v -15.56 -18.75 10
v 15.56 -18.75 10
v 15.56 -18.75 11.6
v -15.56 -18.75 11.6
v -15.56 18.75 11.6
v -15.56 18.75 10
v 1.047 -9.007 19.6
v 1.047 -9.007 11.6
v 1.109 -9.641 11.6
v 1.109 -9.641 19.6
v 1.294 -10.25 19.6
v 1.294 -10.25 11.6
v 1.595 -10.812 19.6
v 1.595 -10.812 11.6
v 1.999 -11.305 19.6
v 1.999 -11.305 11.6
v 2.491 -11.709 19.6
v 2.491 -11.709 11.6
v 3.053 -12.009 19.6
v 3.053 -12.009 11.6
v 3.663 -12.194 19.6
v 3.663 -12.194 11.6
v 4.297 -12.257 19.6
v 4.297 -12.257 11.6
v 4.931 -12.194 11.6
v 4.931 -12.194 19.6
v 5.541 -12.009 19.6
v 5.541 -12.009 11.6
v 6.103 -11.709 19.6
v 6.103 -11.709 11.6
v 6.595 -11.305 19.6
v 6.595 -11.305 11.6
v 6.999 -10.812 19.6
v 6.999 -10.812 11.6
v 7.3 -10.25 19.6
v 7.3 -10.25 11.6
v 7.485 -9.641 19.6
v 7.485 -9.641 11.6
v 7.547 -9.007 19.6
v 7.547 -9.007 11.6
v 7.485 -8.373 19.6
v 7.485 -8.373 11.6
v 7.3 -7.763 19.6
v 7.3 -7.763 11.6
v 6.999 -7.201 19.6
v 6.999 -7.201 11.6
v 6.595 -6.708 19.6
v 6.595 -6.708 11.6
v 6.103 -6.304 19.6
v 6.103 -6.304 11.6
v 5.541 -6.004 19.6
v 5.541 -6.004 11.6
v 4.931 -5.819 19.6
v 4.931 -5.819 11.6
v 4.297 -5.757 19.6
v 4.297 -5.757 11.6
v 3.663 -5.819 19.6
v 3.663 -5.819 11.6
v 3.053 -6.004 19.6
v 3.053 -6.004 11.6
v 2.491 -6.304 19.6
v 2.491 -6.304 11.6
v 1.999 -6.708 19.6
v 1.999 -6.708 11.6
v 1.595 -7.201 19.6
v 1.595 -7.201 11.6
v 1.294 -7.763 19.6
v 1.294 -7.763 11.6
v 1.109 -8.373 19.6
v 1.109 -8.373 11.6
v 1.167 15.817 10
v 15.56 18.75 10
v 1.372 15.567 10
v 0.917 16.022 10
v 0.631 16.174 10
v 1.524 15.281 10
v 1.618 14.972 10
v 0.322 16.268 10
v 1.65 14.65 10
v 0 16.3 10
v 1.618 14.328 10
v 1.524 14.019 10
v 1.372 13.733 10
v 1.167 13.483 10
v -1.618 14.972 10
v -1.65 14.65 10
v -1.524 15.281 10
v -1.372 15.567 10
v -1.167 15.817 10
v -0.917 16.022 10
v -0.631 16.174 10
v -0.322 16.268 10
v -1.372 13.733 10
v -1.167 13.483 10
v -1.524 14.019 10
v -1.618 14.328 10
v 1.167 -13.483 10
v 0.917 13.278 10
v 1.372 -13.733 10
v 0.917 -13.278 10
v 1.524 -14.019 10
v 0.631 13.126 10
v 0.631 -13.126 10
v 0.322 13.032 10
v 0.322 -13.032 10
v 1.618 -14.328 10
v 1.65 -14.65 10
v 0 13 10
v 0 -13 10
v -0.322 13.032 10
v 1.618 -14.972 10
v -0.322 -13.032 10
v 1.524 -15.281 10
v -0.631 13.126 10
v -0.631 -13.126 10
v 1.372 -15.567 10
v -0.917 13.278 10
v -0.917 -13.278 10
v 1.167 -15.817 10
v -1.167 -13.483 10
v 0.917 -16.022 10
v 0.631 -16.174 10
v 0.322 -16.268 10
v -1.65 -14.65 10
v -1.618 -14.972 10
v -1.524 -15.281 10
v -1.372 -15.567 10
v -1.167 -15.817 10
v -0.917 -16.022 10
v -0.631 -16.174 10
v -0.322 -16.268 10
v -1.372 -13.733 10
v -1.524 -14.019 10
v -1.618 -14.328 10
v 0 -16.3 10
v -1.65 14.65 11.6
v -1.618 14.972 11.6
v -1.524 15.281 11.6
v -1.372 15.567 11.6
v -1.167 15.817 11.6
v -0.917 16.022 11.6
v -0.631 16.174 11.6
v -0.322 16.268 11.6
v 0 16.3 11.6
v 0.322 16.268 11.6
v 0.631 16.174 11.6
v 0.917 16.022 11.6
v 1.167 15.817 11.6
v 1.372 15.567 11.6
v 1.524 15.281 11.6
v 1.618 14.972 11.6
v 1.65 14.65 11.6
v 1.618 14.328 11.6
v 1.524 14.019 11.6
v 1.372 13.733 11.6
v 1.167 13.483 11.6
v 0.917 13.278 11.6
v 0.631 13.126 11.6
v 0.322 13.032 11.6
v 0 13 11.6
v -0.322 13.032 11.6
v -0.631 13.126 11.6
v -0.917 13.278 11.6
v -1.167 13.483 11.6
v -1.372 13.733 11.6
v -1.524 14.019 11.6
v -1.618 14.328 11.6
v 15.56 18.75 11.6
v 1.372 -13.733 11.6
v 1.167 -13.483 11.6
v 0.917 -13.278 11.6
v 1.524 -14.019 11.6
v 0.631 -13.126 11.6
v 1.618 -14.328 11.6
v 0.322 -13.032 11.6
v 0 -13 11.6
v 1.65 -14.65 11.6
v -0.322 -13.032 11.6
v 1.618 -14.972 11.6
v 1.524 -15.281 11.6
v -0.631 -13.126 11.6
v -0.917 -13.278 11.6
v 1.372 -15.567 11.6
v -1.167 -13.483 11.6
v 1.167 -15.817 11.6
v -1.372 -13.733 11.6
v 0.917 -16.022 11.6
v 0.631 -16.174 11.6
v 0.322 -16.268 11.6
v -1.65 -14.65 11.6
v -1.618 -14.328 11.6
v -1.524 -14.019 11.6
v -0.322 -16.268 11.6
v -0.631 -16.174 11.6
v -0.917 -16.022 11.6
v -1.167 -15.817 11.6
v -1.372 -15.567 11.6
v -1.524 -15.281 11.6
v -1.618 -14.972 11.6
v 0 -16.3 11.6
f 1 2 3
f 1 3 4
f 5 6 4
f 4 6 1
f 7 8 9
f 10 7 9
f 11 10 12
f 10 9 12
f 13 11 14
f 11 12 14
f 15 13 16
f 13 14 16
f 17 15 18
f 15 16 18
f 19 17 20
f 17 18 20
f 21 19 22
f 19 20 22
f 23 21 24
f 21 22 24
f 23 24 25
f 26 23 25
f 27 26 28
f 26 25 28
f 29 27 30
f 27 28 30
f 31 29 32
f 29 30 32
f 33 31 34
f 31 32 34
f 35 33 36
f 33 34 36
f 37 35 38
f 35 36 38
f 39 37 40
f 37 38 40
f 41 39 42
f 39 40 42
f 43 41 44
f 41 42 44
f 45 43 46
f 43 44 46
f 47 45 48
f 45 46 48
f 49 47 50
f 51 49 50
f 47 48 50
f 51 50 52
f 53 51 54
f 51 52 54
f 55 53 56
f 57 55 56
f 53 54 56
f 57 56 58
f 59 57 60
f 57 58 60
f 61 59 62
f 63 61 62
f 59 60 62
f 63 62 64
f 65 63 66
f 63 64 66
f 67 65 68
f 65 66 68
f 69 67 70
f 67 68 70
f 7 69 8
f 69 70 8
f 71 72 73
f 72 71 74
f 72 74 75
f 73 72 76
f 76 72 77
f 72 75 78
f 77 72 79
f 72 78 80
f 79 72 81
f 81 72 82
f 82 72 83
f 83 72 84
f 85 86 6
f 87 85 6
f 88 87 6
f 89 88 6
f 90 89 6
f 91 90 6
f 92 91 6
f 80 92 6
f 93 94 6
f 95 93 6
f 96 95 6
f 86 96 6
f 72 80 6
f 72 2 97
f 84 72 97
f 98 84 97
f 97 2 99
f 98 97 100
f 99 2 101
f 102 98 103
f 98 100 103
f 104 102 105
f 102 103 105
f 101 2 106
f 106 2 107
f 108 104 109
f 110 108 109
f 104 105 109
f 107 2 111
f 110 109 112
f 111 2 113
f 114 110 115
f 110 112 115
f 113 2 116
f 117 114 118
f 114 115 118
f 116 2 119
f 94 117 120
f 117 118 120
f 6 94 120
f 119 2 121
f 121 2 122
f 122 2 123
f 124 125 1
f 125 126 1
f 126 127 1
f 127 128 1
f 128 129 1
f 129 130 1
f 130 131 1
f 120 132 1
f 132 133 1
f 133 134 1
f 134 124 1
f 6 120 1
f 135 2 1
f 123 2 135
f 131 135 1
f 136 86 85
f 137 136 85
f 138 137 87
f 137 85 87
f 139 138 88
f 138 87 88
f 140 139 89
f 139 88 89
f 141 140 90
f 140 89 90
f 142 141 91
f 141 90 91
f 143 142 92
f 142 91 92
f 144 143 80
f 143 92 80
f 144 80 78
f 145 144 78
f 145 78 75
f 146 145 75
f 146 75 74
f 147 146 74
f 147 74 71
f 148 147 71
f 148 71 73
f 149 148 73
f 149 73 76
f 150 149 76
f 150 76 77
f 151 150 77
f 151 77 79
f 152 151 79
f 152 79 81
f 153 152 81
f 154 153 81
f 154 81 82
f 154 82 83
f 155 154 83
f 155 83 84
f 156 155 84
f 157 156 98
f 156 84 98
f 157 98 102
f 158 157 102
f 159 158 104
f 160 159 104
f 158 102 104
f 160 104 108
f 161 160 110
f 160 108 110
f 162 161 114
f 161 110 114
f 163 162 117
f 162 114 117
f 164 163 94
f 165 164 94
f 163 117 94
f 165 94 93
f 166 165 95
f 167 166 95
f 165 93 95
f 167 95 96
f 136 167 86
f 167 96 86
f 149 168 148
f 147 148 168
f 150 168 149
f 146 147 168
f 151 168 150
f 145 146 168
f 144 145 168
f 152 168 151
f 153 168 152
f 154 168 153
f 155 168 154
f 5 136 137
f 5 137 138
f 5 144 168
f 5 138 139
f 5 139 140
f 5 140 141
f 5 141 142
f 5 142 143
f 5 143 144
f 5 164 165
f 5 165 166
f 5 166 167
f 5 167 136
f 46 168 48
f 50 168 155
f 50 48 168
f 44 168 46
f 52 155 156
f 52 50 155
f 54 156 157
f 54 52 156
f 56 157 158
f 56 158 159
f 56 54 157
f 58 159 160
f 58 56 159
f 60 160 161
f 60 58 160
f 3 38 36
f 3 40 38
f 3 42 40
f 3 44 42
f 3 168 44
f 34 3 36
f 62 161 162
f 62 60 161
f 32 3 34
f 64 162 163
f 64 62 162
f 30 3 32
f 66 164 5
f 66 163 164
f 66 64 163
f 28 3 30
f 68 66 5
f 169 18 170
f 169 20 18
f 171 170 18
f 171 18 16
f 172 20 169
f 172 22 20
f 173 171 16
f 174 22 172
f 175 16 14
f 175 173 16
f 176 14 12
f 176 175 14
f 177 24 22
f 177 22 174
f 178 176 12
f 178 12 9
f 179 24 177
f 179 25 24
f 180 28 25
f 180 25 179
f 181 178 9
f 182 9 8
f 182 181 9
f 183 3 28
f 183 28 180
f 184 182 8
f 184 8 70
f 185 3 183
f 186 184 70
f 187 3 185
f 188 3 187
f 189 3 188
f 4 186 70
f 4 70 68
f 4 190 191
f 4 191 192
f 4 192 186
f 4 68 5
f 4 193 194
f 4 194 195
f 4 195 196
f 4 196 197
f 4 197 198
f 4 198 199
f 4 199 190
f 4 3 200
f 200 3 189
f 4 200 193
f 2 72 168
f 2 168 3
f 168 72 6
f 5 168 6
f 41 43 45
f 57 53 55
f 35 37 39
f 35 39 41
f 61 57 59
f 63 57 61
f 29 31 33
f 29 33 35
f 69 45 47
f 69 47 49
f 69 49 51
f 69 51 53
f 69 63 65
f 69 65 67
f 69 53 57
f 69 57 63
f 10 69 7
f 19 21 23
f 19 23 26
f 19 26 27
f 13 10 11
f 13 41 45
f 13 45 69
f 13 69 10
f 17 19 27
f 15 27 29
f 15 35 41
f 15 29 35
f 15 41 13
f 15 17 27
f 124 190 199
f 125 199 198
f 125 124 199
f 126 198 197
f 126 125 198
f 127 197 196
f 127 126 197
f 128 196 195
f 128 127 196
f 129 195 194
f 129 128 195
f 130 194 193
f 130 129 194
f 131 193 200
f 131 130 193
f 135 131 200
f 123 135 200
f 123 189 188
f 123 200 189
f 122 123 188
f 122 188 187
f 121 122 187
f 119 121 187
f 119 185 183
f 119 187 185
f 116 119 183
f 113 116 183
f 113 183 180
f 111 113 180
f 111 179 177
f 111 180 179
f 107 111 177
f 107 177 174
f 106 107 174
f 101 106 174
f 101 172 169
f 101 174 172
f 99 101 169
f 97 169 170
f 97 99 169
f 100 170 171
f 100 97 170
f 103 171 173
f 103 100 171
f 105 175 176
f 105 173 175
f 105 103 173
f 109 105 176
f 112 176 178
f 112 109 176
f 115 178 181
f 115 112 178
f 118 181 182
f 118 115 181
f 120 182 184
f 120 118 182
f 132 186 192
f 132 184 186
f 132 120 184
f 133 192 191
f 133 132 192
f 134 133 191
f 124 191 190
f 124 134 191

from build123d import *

# Parameters (mm, degrees)
SKETCH018_W             = 31.12
SKETCH018_H             = 37.5
PAD010_DEPTH            = 1.6
SKETCH019_R             = 1.65
POCKET006_DEPTH         = 99.115397
SKETCH032_R             = 3.25
PAD018_DEPTH            = 8
BODY003_PLACEMENT_ANGLE = 180


with BuildPart() as part:
    # Sketch018 → Pad010 (new body)
    with BuildSketch(Plane.XY):
        Rectangle(SKETCH018_W, SKETCH018_H)
    extrude(amount=PAD010_DEPTH)

    # Sketch019 (on Face5 of Pad010) → Pocket006 (cut, through all)
    with BuildSketch(Plane(origin=(0, 0, 0), x_dir=(1, 0, 0), z_dir=(0, 0, -1))):
        with Locations((0, 14.65)):
            Circle(SKETCH019_R)
    pocket006 = extrude(amount=-POCKET006_DEPTH, mode=Mode.SUBTRACT)

    # Mirrored008: Pocket006 across Sketch019 H_Axis
    add(pocket006.mirror(Plane(origin=(0, 0, 0), x_dir=(0, 0, -1), z_dir=(0, -1, 0))), mode=Mode.SUBTRACT)

    # Sketch032 (on Face5 of Mirrored008) → Pad018 (join)
    with BuildSketch(Plane.XY.offset(1.6)):
        with Locations((-4.296995, 9.00655)):
            Circle(SKETCH032_R)
    extrude(amount=PAD018_DEPTH)


with BuildPart() as part_1:
    # Body003 placement: moved
    add(part.part.moved(Location((0, 0, 10))).rotate(Axis((0, 0, 10), (0, 0, 1)), BODY003_PLACEMENT_ANGLE))


solid = part_1.part
